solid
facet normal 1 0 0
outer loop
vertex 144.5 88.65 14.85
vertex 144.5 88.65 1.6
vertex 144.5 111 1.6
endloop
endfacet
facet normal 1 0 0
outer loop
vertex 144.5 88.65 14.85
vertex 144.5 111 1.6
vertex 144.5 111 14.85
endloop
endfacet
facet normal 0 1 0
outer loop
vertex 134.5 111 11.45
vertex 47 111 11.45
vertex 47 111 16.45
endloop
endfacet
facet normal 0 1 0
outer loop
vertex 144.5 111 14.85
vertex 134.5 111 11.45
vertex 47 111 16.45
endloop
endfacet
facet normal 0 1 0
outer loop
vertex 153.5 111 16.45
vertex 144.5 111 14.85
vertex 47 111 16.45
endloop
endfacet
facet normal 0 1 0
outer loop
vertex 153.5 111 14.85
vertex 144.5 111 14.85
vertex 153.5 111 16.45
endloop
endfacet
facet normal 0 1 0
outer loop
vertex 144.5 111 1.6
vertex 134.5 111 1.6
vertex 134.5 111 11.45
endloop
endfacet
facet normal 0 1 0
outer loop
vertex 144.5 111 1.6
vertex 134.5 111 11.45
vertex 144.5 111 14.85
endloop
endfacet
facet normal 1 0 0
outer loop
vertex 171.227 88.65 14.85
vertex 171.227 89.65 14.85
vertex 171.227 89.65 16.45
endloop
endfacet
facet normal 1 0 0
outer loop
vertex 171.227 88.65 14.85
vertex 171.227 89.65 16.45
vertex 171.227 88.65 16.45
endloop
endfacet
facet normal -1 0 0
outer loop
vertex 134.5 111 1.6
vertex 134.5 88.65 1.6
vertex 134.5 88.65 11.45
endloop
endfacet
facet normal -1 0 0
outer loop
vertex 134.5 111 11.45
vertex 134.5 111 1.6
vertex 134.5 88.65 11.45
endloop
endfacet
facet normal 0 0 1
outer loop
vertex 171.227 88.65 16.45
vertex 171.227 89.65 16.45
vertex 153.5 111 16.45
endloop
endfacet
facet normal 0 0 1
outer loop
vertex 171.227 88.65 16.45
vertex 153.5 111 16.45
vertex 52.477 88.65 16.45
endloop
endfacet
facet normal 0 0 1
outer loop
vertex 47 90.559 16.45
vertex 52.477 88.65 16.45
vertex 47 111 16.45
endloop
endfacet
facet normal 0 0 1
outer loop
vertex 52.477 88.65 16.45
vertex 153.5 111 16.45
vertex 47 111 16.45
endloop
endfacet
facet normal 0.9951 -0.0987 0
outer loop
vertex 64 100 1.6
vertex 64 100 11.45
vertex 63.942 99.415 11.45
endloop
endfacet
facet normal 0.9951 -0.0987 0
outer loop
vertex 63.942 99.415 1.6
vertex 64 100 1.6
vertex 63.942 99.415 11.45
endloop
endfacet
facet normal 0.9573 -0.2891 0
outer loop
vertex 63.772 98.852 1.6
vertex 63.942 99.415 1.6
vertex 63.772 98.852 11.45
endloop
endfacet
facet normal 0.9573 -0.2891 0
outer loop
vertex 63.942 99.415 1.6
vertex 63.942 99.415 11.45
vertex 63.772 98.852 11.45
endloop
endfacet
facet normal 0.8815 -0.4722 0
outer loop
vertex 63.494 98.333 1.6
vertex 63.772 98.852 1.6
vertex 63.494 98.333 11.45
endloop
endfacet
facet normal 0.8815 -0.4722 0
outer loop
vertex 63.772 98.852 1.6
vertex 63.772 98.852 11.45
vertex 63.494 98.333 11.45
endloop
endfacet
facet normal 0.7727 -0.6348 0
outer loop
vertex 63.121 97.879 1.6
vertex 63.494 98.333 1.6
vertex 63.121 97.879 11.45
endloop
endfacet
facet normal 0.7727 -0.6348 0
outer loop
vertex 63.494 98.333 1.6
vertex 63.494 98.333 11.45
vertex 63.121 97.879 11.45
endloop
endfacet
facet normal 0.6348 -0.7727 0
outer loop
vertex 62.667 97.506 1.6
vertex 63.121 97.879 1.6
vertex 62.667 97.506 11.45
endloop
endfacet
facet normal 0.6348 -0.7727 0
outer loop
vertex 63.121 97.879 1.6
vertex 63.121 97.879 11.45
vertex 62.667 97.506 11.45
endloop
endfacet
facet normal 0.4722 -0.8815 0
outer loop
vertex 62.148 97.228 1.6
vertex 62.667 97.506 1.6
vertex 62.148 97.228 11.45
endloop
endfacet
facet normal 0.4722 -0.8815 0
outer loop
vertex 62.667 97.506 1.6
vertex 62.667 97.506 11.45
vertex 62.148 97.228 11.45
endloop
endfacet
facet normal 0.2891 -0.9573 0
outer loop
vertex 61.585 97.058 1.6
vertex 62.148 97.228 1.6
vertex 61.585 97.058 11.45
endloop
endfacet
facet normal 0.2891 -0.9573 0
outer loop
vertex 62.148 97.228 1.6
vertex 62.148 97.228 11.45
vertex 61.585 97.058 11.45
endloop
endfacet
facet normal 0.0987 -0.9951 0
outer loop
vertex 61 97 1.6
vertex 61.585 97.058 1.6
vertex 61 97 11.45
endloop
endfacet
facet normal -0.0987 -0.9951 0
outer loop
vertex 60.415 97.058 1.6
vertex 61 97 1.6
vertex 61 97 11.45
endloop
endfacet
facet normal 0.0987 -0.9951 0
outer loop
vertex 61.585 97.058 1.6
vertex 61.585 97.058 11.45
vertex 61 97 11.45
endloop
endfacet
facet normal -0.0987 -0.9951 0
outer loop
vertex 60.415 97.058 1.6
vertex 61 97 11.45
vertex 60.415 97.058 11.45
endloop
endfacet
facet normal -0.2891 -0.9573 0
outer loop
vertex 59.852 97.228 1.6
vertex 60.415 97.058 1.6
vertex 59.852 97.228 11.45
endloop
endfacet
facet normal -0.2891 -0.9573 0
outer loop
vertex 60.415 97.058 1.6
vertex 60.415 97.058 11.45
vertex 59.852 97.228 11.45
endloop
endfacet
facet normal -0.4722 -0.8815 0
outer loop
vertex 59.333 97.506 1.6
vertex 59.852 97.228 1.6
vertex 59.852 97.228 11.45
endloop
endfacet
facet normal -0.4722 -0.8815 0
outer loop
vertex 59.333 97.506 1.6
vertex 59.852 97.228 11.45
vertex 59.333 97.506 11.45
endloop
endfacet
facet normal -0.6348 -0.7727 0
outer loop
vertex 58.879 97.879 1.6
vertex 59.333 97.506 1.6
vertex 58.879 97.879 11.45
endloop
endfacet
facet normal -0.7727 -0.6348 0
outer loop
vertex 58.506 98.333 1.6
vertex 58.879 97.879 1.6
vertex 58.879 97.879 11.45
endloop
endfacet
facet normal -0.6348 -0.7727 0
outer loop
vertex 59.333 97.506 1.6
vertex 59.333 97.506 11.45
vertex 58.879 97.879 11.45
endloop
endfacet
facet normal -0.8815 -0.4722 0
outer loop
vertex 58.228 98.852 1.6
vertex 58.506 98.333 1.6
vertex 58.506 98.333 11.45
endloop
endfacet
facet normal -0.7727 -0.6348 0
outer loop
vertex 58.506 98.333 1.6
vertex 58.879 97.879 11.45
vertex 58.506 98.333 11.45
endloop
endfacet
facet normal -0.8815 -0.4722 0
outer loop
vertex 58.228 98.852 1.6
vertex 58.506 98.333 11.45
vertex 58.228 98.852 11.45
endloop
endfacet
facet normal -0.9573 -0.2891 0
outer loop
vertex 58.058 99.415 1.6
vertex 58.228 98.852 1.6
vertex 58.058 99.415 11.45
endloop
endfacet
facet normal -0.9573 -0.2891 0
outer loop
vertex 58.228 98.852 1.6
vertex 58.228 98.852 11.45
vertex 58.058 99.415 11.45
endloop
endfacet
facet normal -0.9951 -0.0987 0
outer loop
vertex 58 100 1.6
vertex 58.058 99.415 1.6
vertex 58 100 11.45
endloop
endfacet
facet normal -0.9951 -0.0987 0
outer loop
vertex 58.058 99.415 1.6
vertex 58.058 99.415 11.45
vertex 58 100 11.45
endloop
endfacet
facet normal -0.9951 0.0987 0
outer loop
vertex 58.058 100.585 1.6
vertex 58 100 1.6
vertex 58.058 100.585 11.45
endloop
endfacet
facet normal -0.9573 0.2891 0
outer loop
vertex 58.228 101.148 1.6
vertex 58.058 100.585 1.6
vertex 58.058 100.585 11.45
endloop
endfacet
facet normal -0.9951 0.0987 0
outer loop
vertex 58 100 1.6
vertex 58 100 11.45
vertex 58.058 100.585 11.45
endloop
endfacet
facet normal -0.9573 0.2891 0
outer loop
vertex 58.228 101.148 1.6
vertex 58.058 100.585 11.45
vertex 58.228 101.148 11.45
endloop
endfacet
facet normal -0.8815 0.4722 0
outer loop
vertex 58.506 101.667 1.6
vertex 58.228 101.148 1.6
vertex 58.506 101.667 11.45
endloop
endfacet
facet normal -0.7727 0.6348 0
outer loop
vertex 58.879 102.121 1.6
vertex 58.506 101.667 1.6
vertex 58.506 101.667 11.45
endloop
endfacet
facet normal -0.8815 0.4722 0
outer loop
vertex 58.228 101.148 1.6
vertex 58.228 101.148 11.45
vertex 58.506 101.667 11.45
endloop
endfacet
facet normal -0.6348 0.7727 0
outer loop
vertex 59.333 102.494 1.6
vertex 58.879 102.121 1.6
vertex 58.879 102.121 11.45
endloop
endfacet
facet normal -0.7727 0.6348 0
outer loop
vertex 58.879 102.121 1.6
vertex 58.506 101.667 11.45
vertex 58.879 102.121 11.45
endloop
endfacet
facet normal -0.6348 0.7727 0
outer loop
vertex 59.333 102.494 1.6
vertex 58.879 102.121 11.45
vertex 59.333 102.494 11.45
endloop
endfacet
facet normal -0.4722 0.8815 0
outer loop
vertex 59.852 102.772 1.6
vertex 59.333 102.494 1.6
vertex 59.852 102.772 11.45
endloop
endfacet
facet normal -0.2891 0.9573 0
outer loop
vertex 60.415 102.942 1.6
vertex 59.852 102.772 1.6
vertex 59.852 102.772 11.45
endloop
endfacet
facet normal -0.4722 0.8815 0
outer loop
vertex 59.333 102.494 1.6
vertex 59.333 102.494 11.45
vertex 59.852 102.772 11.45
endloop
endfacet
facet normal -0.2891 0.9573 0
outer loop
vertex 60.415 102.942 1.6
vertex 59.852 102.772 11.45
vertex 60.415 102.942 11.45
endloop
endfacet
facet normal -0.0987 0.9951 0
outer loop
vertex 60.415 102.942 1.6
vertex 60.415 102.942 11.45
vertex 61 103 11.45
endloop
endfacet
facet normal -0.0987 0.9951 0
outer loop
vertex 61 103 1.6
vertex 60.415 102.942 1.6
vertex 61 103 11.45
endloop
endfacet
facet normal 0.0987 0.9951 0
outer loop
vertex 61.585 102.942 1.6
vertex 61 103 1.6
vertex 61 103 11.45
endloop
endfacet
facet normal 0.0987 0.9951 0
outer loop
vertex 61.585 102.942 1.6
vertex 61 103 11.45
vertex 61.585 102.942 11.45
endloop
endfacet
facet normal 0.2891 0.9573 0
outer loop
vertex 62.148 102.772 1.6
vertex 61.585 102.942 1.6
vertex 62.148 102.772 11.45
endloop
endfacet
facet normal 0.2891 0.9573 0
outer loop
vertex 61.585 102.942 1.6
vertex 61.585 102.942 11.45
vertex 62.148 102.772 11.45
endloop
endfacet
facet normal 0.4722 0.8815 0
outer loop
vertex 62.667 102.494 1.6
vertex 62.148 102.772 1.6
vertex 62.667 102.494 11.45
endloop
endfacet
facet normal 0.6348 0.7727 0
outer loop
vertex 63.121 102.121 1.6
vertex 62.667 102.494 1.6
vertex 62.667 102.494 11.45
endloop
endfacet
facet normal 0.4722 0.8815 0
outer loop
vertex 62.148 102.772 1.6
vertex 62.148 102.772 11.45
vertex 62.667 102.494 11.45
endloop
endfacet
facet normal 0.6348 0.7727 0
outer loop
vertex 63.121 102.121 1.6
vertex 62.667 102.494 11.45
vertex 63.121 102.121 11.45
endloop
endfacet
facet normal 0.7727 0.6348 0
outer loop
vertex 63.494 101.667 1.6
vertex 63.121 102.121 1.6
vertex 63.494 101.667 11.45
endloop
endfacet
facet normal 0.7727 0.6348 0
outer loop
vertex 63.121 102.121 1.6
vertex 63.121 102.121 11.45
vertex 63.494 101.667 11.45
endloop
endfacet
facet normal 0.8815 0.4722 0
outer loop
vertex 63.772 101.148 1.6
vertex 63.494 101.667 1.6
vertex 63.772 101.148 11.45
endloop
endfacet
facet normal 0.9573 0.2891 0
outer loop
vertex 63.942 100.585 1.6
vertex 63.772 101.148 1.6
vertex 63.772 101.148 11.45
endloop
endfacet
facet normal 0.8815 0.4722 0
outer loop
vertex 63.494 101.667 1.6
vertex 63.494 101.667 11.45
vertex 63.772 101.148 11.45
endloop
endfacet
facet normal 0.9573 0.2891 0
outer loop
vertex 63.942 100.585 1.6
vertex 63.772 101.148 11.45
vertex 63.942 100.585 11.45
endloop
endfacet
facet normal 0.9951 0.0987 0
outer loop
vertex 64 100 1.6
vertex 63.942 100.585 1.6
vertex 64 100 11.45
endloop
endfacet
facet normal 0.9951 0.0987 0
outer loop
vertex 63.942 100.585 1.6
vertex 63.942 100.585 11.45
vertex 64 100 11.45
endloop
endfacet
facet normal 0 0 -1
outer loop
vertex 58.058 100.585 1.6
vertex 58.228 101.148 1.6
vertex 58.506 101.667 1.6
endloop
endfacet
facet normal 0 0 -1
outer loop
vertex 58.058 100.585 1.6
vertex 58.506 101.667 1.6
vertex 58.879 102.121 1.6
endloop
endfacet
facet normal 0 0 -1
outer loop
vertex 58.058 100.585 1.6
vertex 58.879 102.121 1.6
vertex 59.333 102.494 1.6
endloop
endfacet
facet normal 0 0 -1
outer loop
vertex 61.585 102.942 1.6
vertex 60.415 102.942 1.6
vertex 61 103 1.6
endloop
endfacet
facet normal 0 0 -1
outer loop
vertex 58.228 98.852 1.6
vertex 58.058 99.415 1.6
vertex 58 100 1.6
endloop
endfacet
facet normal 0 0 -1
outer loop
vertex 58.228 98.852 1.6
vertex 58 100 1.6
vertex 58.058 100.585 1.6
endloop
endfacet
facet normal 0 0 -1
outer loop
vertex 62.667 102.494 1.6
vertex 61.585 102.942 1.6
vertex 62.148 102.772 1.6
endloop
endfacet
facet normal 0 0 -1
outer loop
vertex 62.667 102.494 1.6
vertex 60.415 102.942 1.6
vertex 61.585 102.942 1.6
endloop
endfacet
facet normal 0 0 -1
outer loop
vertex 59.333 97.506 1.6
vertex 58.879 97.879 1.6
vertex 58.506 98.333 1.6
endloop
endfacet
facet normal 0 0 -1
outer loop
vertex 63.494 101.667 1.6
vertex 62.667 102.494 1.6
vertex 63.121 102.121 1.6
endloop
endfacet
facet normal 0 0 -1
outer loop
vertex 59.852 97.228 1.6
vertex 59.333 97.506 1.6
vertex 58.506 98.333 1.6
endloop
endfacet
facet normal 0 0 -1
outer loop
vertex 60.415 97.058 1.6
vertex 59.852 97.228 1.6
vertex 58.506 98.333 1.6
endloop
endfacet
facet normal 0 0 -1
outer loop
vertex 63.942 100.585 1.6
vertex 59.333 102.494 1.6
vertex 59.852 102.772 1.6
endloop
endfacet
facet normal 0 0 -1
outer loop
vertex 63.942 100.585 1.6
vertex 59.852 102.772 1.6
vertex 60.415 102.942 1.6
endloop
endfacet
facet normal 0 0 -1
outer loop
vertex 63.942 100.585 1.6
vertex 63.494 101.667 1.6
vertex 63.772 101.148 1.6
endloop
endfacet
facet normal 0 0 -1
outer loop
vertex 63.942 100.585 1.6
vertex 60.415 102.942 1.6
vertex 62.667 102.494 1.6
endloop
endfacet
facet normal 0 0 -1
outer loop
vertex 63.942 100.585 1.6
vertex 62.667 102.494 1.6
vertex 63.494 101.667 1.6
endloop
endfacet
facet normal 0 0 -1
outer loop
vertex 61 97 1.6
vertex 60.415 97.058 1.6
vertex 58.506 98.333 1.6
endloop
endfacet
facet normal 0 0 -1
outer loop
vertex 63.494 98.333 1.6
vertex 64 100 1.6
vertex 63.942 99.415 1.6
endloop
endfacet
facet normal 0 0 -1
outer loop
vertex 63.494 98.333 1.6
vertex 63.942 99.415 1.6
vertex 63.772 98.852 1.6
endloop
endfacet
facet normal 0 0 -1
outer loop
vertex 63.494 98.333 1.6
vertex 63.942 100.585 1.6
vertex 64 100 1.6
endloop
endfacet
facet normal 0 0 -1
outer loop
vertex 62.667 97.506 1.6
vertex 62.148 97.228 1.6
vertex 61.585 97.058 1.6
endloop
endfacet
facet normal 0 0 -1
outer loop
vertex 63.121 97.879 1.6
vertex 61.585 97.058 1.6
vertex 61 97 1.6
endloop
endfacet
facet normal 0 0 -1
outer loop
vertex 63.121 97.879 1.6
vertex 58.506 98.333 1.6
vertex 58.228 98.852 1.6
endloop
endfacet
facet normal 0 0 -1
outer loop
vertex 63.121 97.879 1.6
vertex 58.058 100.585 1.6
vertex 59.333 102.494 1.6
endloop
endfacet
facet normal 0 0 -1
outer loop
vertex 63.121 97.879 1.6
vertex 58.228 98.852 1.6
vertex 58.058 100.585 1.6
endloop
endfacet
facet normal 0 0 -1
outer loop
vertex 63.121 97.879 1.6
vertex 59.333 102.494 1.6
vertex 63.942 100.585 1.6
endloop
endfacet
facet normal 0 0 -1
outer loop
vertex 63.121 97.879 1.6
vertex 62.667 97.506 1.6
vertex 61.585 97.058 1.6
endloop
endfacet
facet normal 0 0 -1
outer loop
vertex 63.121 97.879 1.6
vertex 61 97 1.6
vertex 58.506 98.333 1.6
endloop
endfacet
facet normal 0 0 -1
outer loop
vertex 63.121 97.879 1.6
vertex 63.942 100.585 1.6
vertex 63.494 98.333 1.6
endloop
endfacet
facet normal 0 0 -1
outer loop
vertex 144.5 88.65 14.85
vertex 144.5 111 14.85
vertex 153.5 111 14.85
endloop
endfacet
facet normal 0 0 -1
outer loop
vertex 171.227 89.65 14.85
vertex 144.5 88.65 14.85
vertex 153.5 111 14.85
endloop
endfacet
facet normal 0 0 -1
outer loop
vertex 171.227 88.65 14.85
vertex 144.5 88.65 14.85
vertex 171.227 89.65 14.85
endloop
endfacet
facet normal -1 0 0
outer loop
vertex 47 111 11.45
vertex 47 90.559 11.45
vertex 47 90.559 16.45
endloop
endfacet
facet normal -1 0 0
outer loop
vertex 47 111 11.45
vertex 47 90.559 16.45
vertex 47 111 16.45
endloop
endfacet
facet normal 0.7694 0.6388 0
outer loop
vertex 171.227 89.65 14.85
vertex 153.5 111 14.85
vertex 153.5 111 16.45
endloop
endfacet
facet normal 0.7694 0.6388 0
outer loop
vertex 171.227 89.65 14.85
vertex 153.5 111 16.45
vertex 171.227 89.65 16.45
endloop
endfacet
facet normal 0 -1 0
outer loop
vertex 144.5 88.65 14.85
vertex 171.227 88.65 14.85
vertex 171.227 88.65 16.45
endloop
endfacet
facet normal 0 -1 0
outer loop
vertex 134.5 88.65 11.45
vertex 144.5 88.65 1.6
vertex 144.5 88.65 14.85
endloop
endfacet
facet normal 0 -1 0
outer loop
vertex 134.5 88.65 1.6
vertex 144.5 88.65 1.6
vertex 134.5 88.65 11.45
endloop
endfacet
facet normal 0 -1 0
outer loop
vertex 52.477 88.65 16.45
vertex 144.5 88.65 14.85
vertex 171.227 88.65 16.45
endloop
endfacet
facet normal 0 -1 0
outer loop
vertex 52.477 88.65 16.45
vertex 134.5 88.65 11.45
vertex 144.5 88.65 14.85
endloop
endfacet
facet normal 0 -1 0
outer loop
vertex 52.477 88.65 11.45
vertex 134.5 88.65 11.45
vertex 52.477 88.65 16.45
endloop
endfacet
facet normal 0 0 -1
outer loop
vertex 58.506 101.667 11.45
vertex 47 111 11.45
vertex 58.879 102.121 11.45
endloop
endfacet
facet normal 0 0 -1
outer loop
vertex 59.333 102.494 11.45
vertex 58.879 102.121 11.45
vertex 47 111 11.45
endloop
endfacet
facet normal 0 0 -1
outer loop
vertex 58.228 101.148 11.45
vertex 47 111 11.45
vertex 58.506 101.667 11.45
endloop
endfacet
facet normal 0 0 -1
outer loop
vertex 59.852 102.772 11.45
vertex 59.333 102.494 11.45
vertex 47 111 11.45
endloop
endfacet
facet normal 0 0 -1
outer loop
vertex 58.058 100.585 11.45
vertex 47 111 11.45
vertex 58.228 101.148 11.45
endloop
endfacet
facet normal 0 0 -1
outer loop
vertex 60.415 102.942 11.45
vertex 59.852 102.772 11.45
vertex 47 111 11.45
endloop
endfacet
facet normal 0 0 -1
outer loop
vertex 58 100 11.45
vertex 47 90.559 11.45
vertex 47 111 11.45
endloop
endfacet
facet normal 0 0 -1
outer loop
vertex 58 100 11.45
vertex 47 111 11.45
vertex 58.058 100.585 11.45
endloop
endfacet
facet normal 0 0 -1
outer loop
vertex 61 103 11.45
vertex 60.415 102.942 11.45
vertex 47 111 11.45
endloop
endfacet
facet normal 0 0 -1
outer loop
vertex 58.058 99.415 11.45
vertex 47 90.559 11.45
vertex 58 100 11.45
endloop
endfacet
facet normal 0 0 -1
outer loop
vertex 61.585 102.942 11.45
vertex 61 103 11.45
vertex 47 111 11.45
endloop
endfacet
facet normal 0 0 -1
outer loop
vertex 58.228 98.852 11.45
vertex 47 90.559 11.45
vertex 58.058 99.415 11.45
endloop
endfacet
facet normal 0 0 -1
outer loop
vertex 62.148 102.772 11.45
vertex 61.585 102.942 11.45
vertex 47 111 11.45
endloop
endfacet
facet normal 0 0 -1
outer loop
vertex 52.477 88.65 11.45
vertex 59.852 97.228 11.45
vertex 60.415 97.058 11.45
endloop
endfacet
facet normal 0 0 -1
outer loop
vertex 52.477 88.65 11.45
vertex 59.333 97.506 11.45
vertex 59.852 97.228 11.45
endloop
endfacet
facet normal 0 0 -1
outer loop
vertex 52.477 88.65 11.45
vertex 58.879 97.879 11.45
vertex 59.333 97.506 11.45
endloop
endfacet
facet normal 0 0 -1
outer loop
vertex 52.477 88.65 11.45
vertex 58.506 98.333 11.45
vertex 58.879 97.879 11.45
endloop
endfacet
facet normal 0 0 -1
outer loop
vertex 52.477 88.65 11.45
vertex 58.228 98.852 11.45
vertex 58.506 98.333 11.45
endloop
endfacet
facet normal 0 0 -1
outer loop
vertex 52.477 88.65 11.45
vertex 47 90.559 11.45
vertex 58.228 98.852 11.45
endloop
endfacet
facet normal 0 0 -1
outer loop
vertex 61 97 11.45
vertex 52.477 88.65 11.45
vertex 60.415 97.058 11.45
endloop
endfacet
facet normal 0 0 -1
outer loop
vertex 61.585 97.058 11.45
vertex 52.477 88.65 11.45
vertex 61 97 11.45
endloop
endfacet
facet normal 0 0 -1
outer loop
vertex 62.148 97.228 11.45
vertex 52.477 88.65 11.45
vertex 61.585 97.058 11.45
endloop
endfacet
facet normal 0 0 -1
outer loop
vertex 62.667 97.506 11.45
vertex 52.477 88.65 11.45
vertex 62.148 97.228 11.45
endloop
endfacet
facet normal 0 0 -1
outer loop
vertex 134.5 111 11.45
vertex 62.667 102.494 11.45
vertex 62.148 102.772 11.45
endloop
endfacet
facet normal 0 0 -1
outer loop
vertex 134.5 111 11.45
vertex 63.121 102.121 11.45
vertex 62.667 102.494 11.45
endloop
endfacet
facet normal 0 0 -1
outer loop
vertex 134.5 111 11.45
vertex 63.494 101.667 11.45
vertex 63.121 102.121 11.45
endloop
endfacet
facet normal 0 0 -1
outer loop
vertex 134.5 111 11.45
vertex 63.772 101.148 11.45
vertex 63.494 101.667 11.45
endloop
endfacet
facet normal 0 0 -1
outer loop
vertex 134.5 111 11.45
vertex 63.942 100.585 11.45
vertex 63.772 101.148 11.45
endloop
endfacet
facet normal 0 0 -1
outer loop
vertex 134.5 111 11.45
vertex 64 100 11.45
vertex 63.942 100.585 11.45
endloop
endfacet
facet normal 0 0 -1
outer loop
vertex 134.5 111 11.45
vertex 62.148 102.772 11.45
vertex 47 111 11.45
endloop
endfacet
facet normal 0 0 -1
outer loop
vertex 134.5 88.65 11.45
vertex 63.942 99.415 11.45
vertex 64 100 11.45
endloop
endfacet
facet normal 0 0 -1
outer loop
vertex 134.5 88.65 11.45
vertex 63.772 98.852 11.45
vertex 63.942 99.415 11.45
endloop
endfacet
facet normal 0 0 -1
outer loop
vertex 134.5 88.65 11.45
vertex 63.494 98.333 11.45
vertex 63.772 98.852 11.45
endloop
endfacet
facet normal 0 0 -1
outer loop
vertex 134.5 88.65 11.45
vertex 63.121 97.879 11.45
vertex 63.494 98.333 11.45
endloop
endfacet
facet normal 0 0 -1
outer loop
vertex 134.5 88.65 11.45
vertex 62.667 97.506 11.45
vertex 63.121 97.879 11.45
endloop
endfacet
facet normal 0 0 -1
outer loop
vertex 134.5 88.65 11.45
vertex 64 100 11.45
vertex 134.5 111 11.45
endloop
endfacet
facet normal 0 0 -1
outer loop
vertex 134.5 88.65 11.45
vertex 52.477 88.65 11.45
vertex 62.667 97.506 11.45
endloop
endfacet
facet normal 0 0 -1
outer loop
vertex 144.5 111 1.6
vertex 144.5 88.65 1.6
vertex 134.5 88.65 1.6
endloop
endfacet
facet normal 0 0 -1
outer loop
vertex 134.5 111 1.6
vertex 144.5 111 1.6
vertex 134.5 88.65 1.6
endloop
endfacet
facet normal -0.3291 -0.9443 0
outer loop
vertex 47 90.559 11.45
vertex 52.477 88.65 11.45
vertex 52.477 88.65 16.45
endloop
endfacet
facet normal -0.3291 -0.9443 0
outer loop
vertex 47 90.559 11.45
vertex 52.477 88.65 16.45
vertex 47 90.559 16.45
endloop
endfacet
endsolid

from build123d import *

# Parameters (mm, degrees)
PAD067_DEPTH    = 14.85
SKETCH113_W     = 92.842344
SKETCH113_H     = 21.437685
SKETCH113_W_2   = 28.846216
SKETCH113_H_2   = 21.567847
POCKET027_DEPTH = 22.351
SKETCH114_R     = 3
PAD068_DEPTH    = 9.85


with BuildPart() as part:
    # Sketch112 (on DatumPlane) → Pad067 (new body)
    with BuildSketch(Plane.XY.offset(1.6)):
        Polygon((47, 111), (153.5, 111), (171.2268158449, 89.65), (171.2268158449, 88.65), (52.4768158449, 88.65), (47, 90.5590542687), align=None)
    extrude(amount=PAD067_DEPTH)

    # Sketch113 (on Face4 of Pad067) → Pocket027 (cut, through all)
    with BuildSketch(Plane(origin=(0, 88.65, 1.6), x_dir=(1, 0, 0), z_dir=(0, -1, 0))):
        with Locations((88.078828, -0.8688425)):
            Rectangle(SKETCH113_W, SKETCH113_H)
        with Locations((158.923108, 2.4660765)):
            Rectangle(SKETCH113_W_2, SKETCH113_H_2)
    extrude(amount=-POCKET027_DEPTH, mode=Mode.SUBTRACT)

    # Sketch114 (on Face2 of Pocket027) → Pad068 (join)
    with BuildSketch(Plane(origin=(0, 0, 11.45), x_dir=(1, 0, 0), z_dir=(0, 0, -1))):
        with Locations((61, -100)):
            Circle(SKETCH114_R)
    extrude(amount=PAD068_DEPTH)


solid = part.part
